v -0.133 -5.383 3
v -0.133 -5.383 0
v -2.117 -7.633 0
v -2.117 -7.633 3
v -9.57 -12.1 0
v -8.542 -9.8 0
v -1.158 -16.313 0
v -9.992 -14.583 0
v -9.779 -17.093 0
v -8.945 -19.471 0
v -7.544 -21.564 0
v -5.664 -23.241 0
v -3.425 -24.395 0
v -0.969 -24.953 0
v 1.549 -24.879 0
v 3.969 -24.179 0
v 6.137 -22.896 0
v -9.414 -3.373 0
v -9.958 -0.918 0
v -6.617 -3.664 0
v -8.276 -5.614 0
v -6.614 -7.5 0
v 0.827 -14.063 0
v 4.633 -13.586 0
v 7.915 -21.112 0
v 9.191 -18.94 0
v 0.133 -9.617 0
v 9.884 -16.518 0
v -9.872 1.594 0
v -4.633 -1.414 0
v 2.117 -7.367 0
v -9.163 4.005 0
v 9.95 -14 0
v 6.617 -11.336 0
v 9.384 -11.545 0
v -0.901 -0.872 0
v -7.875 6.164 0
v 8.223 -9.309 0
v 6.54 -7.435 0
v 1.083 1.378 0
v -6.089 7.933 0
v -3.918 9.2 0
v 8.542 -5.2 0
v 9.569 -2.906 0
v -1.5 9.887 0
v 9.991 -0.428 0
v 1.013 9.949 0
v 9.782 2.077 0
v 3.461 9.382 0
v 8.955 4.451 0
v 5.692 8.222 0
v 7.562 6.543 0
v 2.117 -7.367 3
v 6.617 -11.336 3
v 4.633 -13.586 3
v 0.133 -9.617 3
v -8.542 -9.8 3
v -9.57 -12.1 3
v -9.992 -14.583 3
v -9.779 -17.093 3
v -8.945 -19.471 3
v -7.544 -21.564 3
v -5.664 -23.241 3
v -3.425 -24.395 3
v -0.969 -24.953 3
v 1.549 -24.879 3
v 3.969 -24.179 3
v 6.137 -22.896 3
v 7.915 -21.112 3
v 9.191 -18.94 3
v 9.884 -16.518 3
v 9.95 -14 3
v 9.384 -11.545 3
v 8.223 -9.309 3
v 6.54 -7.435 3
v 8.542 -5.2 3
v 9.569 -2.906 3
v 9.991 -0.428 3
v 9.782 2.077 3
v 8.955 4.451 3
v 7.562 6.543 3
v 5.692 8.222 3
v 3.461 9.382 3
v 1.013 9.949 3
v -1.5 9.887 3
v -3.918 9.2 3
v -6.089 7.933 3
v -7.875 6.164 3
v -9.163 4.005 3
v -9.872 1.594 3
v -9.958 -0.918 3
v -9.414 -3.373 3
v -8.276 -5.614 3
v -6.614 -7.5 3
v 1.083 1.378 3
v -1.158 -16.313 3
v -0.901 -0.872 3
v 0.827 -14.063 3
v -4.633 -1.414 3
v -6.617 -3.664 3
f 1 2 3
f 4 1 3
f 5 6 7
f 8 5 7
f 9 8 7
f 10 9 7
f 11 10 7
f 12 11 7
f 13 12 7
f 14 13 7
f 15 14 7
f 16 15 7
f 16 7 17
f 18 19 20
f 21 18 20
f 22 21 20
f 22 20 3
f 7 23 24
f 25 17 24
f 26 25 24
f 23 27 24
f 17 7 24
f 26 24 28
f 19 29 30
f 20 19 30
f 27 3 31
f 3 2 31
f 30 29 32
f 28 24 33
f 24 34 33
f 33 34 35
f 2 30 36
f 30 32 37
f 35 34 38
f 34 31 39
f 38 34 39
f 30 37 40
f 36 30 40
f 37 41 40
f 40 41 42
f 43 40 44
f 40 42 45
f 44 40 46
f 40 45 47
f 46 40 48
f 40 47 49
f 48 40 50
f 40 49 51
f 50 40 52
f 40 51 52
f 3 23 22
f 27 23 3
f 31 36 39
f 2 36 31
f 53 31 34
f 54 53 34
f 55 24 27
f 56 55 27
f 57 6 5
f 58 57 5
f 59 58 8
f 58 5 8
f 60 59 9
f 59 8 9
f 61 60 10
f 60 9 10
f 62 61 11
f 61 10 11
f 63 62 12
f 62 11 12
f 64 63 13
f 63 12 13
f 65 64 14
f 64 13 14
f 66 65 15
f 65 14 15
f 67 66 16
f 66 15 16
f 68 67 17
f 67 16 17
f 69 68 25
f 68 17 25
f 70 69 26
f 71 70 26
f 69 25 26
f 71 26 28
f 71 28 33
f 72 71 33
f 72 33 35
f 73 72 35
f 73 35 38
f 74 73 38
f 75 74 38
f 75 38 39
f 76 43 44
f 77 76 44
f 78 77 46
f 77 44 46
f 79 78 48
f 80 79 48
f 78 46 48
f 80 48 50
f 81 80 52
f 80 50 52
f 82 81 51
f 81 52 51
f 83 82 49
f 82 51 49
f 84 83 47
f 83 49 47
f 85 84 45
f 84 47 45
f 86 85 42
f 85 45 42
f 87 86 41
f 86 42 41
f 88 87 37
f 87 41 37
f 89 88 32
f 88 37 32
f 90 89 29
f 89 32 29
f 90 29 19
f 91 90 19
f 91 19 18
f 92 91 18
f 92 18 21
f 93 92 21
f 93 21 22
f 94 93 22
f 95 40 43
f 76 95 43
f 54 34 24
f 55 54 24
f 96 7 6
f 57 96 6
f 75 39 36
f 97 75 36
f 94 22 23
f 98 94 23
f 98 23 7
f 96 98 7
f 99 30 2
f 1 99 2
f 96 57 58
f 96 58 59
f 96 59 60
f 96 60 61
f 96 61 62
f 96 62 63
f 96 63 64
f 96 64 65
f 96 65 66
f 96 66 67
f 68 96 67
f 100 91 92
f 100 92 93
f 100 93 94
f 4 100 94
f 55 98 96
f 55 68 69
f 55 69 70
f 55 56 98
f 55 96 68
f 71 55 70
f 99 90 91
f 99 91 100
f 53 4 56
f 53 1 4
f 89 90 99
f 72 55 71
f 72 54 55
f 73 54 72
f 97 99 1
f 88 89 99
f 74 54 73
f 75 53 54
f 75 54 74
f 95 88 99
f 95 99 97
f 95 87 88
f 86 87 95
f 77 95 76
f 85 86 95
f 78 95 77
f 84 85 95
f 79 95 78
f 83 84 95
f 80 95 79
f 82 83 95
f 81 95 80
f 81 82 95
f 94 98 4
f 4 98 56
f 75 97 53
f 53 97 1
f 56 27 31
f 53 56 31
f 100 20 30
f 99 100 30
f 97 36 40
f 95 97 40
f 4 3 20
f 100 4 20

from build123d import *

# Parameters (mm, degrees)
SALIENTE_EXTRUIR1_DEPTH = 3
CORTAR_EXTRUIR2_REACH   = 5


with BuildPart() as part:
    # Croquis1 → Saliente-Extruir1 (new body)
    with BuildSketch(Plane.XY):
        with BuildLine():
            Line((-6.614427743, -7.499956375), (0.826760185, -14.062554531))
            Line((0.826760185, -14.062554531), (-1.157568138, -16.312541443))
            Line((-1.157568138, -16.312541443), (-8.541931773, -9.80005827))
            ThreePointArc((-8.541931773, -9.80005827), (1.549305596, -24.879455682), (6.540102602, -7.434879356))
            Line((6.540102602, -7.434879356), (-0.901085326, -0.872281201))
            Line((-0.901085326, -0.872281201), (1.083242997, 1.377705712))
            Line((1.083242997, 1.377705712), (8.541627127, -5.20005827))
            ThreePointArc((8.541627127, -5.20005827), (-1.500302366, 9.886814088), (-6.614427743, -7.499956375))
        make_face()
    extrude(amount=SALIENTE_EXTRUIR1_DEPTH)

    # Croquis2 → Cortar-Extruir2 (cut, up to next)
    with BuildSketch(Plane(origin=(0, 0, 0), x_dir=(-1, 0, 0), z_dir=(0, 0, -1)), mode=Mode.PRIVATE) as cortar_extruir2_sk1:
        Polygon((-4.63280312, -13.586006872), (-0.132829295, -9.617350226), (-2.117157618, -7.367363313), (-6.617131443, -11.336019959), align=None)
    cortar_extruir2_tool1 = extrude(cortar_extruir2_sk1.sketch, amount=-CORTAR_EXTRUIR2_REACH, mode=Mode.PRIVATE) & part.part
    add(cortar_extruir2_tool1.solids().sort_by_distance((3.37498, -10.476685, 0))[0], mode=Mode.SUBTRACT)
    # Croquis2 → Cortar-Extruir2 (cut, up to next)
    with BuildSketch(Plane(origin=(0, 0, 0), x_dir=(-1, 0, 0), z_dir=(0, 0, -1)), mode=Mode.PRIVATE) as cortar_extruir2_sk2:
        Polygon((6.617131443, -3.664365257), (4.63280312, -1.414378344), (0.132829295, -5.38303499), (2.117157618, -7.633021903), align=None)
    cortar_extruir2_tool2 = extrude(cortar_extruir2_sk2.sketch, amount=-CORTAR_EXTRUIR2_REACH, mode=Mode.PRIVATE) & part.part
    add(cortar_extruir2_tool2.solids().sort_by_distance((-3.37498, -4.5237, 0))[0], mode=Mode.SUBTRACT)


solid = part.part
